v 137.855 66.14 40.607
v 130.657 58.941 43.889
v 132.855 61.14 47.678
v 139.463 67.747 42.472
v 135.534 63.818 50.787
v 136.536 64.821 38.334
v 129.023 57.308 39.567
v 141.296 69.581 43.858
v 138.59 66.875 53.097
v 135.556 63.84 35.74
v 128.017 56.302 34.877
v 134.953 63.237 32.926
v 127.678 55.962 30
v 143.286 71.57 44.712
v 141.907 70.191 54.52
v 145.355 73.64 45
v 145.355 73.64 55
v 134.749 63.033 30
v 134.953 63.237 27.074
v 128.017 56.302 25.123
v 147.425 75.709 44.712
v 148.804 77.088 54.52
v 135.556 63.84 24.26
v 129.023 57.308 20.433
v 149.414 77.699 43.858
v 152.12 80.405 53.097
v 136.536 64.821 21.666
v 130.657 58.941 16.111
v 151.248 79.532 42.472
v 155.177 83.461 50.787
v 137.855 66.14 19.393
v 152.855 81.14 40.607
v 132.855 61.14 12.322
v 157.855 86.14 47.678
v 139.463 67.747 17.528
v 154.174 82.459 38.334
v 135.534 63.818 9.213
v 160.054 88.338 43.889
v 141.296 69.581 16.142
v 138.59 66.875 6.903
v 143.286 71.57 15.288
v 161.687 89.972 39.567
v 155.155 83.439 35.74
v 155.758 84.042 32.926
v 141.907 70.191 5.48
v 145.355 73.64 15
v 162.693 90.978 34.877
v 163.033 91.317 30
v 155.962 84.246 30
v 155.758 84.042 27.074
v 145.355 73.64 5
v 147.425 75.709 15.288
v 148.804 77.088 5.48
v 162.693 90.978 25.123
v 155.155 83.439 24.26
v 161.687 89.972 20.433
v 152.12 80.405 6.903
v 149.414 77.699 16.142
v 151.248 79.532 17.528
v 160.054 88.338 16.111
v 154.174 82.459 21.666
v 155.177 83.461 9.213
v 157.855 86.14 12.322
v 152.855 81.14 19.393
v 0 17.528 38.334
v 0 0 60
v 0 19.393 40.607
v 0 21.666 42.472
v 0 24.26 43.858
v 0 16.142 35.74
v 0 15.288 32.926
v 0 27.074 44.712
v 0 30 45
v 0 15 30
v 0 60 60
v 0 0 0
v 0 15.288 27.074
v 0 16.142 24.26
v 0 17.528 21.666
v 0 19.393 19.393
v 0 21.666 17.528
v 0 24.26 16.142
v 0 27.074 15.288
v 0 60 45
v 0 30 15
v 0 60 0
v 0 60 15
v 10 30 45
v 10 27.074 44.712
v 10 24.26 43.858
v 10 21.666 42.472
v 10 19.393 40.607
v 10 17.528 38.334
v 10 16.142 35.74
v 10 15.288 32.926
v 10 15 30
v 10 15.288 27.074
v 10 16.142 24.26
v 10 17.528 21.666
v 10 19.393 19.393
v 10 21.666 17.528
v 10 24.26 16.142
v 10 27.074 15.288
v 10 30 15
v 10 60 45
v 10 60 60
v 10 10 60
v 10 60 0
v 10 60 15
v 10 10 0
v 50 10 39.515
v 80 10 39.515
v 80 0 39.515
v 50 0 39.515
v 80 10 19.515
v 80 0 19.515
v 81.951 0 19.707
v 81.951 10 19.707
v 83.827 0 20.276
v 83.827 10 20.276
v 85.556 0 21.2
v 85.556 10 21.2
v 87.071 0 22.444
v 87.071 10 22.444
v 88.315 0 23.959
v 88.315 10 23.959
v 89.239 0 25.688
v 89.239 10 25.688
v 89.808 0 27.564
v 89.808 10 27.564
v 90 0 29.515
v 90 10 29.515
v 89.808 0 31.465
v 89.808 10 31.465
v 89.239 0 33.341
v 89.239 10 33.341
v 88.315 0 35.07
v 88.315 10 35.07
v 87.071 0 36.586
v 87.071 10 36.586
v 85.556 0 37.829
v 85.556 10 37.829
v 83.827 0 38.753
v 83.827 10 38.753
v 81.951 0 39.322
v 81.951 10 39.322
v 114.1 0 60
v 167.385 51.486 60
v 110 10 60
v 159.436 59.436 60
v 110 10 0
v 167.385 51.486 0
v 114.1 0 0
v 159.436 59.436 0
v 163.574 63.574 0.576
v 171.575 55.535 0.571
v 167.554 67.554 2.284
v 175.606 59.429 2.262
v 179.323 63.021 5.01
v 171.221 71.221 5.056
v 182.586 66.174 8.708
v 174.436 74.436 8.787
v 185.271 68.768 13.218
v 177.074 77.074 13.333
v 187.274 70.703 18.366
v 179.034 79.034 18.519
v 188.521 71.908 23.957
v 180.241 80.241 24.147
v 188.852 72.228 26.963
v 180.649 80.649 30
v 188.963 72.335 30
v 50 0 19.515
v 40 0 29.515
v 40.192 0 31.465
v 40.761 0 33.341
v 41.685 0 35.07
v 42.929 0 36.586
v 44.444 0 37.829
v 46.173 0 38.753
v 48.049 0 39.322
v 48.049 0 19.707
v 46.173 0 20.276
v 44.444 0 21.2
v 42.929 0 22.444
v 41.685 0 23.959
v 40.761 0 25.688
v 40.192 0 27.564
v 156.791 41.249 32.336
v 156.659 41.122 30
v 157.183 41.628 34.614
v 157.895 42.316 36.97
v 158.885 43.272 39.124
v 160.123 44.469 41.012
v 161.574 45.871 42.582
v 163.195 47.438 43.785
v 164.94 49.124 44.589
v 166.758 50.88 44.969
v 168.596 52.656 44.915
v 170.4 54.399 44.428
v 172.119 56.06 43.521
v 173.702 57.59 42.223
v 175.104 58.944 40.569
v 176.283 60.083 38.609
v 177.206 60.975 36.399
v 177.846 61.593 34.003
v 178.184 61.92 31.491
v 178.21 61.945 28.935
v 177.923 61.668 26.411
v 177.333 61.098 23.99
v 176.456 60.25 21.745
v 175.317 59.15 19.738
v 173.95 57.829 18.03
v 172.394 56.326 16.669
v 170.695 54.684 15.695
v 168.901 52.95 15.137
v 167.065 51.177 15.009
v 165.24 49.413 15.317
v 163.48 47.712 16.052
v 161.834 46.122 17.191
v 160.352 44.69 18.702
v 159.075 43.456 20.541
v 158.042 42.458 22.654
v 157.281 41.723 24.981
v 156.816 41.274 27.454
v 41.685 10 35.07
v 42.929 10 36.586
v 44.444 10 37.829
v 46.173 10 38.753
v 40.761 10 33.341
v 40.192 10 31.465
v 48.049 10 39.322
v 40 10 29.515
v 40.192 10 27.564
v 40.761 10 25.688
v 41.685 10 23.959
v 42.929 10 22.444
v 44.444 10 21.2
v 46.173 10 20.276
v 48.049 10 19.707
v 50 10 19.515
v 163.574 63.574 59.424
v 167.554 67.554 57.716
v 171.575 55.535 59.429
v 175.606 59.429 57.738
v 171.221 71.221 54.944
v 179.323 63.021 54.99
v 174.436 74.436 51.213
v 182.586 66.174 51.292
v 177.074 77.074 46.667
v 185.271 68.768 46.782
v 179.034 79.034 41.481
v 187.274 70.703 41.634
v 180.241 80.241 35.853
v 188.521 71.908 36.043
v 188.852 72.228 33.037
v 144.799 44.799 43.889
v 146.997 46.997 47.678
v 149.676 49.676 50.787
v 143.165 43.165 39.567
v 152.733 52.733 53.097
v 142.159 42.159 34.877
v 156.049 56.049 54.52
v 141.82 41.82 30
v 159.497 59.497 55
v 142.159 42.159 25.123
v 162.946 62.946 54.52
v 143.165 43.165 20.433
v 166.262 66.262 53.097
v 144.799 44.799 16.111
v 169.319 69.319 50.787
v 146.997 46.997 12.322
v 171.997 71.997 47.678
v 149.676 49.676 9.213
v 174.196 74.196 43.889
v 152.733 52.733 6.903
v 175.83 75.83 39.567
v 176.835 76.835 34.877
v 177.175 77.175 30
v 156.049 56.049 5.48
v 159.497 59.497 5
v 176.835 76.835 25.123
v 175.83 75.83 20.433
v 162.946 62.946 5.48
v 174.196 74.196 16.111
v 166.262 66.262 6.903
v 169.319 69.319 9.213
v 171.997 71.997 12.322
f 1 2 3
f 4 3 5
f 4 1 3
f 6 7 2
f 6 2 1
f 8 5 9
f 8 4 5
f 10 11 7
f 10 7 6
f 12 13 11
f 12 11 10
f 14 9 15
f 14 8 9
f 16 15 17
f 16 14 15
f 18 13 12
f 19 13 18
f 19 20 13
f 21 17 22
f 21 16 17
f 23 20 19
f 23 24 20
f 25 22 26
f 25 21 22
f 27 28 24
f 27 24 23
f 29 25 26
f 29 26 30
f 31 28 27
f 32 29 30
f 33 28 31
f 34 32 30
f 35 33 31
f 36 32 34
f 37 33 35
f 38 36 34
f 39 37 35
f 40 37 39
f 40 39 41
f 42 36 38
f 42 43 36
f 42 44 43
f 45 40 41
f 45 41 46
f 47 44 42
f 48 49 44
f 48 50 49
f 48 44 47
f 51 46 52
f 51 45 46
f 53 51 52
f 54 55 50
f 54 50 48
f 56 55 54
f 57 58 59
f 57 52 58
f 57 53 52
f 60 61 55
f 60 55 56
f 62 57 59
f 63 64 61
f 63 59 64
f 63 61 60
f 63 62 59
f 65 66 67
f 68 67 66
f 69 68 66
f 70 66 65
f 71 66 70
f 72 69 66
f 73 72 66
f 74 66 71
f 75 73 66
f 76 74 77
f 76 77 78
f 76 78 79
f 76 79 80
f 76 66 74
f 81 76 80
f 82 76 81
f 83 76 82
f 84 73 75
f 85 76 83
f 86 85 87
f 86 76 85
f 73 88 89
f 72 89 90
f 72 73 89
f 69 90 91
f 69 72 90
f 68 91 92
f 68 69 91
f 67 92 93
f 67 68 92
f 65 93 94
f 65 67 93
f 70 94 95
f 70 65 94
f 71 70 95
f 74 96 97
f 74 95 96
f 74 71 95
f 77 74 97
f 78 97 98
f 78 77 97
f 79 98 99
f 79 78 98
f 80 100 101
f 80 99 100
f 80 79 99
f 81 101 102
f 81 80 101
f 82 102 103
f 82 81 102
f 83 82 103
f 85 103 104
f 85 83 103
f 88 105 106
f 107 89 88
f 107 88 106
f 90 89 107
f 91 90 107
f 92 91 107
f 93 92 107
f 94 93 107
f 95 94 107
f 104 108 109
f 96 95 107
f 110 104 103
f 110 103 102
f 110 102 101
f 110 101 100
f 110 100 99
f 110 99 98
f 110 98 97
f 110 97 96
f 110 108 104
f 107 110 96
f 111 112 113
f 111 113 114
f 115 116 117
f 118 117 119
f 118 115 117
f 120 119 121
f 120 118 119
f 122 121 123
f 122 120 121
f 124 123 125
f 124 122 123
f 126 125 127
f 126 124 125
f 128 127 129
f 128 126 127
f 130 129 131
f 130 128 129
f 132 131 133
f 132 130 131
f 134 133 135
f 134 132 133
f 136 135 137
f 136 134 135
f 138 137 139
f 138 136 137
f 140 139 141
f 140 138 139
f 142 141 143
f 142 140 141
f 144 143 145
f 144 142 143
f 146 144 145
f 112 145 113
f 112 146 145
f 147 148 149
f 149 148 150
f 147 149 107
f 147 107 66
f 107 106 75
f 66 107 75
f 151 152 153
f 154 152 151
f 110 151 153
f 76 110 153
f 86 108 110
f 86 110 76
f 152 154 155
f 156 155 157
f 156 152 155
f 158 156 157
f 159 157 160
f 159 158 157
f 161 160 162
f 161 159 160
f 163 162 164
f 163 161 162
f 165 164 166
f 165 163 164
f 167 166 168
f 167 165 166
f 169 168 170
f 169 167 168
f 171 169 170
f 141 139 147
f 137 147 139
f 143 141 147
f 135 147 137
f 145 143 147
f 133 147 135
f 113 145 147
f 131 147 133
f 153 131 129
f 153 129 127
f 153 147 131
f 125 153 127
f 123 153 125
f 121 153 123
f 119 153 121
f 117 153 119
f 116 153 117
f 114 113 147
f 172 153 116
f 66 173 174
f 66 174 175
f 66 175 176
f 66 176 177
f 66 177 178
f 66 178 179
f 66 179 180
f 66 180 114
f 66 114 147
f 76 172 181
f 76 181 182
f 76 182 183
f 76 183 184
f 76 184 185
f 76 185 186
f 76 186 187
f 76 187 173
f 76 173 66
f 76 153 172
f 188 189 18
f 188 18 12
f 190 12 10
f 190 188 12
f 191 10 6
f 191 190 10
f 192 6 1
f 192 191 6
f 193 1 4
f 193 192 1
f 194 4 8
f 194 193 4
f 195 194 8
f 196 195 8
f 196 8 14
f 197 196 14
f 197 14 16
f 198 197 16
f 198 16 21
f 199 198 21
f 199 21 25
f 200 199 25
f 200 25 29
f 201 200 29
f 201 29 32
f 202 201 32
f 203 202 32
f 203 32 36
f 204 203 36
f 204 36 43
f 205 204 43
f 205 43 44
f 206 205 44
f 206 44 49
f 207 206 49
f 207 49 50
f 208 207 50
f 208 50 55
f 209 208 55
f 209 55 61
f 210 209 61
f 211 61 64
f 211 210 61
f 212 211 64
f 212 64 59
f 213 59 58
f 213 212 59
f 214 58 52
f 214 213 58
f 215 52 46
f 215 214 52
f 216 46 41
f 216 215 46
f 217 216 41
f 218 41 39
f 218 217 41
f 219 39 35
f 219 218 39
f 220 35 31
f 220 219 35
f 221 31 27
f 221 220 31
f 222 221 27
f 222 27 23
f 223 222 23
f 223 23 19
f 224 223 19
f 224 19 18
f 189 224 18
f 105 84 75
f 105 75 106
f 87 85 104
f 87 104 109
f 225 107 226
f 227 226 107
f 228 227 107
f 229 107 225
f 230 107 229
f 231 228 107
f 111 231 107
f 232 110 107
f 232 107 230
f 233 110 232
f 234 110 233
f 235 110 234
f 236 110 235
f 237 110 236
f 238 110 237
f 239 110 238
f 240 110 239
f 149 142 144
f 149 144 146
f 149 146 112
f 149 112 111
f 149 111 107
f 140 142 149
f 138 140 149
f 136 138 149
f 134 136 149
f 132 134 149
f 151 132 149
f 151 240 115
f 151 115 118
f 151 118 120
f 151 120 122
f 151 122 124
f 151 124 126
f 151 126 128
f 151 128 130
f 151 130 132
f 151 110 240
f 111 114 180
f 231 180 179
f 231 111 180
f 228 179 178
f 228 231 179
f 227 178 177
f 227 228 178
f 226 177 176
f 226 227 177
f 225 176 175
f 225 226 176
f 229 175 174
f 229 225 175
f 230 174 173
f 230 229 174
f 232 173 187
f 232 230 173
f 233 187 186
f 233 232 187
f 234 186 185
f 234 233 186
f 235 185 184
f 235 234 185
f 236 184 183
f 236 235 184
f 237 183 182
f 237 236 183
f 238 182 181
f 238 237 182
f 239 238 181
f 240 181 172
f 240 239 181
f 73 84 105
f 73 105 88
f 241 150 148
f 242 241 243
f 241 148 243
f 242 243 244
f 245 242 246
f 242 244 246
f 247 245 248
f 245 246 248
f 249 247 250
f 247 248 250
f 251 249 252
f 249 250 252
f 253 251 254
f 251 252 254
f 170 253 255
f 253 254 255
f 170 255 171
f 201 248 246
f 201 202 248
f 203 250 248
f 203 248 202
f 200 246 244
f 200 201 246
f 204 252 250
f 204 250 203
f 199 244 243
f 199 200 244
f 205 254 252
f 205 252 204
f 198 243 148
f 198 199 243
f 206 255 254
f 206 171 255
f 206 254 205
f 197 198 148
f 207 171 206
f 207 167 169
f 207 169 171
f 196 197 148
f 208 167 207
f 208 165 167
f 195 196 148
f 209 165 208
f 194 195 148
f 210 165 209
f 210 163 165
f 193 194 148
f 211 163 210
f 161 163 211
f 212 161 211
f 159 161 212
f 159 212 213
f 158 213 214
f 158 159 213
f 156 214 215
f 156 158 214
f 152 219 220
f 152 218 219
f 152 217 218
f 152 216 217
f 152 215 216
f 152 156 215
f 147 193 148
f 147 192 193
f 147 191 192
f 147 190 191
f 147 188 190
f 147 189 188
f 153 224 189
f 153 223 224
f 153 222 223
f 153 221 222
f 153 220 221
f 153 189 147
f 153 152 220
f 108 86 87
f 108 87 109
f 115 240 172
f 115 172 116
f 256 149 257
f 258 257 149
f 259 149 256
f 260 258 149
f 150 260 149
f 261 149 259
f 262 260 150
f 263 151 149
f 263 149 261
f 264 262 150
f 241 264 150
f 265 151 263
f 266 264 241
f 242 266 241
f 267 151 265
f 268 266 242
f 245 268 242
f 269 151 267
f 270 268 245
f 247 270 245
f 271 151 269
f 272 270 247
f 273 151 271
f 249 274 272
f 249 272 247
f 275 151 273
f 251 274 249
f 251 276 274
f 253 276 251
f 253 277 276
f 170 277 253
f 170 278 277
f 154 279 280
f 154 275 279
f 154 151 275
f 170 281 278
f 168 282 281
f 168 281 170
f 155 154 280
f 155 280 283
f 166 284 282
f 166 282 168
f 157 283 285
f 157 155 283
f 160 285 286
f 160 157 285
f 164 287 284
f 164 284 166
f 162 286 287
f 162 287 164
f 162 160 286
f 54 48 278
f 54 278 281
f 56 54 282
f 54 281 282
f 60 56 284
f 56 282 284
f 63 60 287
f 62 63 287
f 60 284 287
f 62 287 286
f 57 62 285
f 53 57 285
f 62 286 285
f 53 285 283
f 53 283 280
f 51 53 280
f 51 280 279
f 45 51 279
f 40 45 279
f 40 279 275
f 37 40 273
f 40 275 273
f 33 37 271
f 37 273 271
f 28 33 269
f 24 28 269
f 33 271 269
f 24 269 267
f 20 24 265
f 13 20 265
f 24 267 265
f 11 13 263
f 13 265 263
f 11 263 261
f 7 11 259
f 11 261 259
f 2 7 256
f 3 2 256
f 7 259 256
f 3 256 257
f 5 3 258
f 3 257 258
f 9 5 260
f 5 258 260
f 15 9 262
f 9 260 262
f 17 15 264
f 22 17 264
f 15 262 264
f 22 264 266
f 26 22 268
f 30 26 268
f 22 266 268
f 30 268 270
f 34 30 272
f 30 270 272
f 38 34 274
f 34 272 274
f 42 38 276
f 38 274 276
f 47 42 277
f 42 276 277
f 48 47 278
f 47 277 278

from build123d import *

# Parameters (mm, degrees)
BOSS_EXTRUDE1_DEPTH = 60
SKETCH2_R           = 25
SKETCH2_R_2         = 15
BOSS_EXTRUDE2_DEPTH = 20
FILLET1_R           = 30
CUT_EXTRUDE1_DEPTH  = 20
CUT_EXTRUDE2_DEPTH  = 20
CUT_EXTRUDE3_START  = -14
SKETCH6_R           = 15
CUT_EXTRUDE3_DEPTH  = 14


with BuildPart() as part:
    # Sketch1 → Boss-Extrude1 (new body)
    with BuildSketch(Plane.XY):
        Polygon((0, 0), (0, 60), (10, 60), (10, 10), (110, 10), (180.64896405, 80.64896405), (188.962882852, 72.335045249), (114.1, 0), align=None)
    extrude(amount=BOSS_EXTRUDE1_DEPTH)

    # Sketch2 → Boss-Extrude2 (add)
    with BuildSketch(Plane(origin=(50, -50, 0), x_dir=(0, 0, 1), z_dir=(-0.7071067811865477, 0.7071067811865474, 0))):
        with Locations(Location((30, 154.852813742, 0), (0, 0, 90))):
            Circle(SKETCH2_R)
        with Locations(Location((30, 154.852813742, 0), (0, 0, 270))):
            Circle(SKETCH2_R_2, mode=Mode.SUBTRACT)
    extrude(amount=BOSS_EXTRUDE2_DEPTH)

    # Fillet1
    fillet1_edges = [part.edges().sort_by_distance(p)[0] for p in [
        (184.805923451, 76.49200465, 60),
        (184.805923451, 76.49200465, 0),
    ]]
    fillet(fillet1_edges, radius=FILLET1_R - 0.0001)  # a hair under: the kernel refuses the full size

    # Sketch3 → Cut-Extrude1 (cut)
    with BuildSketch(Plane(origin=(0, 10, 0), x_dir=(1, 0, 0), z_dir=(0, 1, 0))):
        with BuildLine():
            Line((50, -19.514580566), (80, -19.514580566))
            ThreePointArc((80, -19.514580566), (90, -29.514580566), (80, -39.514580566))
            Line((80, -39.514580566), (50, -39.514580566))
            ThreePointArc((50, -39.514580566), (40, -29.514580566), (50, -19.514580566))
        make_face()
    extrude(amount=-CUT_EXTRUDE1_DEPTH, mode=Mode.SUBTRACT)

    # Sketch5 → Cut-Extrude2 (cut)
    with BuildSketch(Plane.ZY):
        with BuildLine():
            Line((15, 30), (15, 130))
            ThreePointArc((15, 130), (30, 145), (45, 130))
            Line((45, 130), (45, 30))
            ThreePointArc((45, 30), (30, 15), (15, 30))
        make_face()
    extrude(amount=-CUT_EXTRUDE2_DEPTH, mode=Mode.SUBTRACT)

    # Sketch6 → Cut-Extrude3 (cut)
    with BuildSketch(Plane(origin=(50, -50, 0), x_dir=(0, 0, 1), z_dir=(-0.7071067811865477, 0.7071067811865474, 0)).offset(CUT_EXTRUDE3_START)):
        with Locations(Location((30, 154.852813742, 0), (0, 0, 270))):
            Circle(SKETCH6_R)
    extrude(amount=CUT_EXTRUDE3_DEPTH, mode=Mode.SUBTRACT)


solid = part.part
